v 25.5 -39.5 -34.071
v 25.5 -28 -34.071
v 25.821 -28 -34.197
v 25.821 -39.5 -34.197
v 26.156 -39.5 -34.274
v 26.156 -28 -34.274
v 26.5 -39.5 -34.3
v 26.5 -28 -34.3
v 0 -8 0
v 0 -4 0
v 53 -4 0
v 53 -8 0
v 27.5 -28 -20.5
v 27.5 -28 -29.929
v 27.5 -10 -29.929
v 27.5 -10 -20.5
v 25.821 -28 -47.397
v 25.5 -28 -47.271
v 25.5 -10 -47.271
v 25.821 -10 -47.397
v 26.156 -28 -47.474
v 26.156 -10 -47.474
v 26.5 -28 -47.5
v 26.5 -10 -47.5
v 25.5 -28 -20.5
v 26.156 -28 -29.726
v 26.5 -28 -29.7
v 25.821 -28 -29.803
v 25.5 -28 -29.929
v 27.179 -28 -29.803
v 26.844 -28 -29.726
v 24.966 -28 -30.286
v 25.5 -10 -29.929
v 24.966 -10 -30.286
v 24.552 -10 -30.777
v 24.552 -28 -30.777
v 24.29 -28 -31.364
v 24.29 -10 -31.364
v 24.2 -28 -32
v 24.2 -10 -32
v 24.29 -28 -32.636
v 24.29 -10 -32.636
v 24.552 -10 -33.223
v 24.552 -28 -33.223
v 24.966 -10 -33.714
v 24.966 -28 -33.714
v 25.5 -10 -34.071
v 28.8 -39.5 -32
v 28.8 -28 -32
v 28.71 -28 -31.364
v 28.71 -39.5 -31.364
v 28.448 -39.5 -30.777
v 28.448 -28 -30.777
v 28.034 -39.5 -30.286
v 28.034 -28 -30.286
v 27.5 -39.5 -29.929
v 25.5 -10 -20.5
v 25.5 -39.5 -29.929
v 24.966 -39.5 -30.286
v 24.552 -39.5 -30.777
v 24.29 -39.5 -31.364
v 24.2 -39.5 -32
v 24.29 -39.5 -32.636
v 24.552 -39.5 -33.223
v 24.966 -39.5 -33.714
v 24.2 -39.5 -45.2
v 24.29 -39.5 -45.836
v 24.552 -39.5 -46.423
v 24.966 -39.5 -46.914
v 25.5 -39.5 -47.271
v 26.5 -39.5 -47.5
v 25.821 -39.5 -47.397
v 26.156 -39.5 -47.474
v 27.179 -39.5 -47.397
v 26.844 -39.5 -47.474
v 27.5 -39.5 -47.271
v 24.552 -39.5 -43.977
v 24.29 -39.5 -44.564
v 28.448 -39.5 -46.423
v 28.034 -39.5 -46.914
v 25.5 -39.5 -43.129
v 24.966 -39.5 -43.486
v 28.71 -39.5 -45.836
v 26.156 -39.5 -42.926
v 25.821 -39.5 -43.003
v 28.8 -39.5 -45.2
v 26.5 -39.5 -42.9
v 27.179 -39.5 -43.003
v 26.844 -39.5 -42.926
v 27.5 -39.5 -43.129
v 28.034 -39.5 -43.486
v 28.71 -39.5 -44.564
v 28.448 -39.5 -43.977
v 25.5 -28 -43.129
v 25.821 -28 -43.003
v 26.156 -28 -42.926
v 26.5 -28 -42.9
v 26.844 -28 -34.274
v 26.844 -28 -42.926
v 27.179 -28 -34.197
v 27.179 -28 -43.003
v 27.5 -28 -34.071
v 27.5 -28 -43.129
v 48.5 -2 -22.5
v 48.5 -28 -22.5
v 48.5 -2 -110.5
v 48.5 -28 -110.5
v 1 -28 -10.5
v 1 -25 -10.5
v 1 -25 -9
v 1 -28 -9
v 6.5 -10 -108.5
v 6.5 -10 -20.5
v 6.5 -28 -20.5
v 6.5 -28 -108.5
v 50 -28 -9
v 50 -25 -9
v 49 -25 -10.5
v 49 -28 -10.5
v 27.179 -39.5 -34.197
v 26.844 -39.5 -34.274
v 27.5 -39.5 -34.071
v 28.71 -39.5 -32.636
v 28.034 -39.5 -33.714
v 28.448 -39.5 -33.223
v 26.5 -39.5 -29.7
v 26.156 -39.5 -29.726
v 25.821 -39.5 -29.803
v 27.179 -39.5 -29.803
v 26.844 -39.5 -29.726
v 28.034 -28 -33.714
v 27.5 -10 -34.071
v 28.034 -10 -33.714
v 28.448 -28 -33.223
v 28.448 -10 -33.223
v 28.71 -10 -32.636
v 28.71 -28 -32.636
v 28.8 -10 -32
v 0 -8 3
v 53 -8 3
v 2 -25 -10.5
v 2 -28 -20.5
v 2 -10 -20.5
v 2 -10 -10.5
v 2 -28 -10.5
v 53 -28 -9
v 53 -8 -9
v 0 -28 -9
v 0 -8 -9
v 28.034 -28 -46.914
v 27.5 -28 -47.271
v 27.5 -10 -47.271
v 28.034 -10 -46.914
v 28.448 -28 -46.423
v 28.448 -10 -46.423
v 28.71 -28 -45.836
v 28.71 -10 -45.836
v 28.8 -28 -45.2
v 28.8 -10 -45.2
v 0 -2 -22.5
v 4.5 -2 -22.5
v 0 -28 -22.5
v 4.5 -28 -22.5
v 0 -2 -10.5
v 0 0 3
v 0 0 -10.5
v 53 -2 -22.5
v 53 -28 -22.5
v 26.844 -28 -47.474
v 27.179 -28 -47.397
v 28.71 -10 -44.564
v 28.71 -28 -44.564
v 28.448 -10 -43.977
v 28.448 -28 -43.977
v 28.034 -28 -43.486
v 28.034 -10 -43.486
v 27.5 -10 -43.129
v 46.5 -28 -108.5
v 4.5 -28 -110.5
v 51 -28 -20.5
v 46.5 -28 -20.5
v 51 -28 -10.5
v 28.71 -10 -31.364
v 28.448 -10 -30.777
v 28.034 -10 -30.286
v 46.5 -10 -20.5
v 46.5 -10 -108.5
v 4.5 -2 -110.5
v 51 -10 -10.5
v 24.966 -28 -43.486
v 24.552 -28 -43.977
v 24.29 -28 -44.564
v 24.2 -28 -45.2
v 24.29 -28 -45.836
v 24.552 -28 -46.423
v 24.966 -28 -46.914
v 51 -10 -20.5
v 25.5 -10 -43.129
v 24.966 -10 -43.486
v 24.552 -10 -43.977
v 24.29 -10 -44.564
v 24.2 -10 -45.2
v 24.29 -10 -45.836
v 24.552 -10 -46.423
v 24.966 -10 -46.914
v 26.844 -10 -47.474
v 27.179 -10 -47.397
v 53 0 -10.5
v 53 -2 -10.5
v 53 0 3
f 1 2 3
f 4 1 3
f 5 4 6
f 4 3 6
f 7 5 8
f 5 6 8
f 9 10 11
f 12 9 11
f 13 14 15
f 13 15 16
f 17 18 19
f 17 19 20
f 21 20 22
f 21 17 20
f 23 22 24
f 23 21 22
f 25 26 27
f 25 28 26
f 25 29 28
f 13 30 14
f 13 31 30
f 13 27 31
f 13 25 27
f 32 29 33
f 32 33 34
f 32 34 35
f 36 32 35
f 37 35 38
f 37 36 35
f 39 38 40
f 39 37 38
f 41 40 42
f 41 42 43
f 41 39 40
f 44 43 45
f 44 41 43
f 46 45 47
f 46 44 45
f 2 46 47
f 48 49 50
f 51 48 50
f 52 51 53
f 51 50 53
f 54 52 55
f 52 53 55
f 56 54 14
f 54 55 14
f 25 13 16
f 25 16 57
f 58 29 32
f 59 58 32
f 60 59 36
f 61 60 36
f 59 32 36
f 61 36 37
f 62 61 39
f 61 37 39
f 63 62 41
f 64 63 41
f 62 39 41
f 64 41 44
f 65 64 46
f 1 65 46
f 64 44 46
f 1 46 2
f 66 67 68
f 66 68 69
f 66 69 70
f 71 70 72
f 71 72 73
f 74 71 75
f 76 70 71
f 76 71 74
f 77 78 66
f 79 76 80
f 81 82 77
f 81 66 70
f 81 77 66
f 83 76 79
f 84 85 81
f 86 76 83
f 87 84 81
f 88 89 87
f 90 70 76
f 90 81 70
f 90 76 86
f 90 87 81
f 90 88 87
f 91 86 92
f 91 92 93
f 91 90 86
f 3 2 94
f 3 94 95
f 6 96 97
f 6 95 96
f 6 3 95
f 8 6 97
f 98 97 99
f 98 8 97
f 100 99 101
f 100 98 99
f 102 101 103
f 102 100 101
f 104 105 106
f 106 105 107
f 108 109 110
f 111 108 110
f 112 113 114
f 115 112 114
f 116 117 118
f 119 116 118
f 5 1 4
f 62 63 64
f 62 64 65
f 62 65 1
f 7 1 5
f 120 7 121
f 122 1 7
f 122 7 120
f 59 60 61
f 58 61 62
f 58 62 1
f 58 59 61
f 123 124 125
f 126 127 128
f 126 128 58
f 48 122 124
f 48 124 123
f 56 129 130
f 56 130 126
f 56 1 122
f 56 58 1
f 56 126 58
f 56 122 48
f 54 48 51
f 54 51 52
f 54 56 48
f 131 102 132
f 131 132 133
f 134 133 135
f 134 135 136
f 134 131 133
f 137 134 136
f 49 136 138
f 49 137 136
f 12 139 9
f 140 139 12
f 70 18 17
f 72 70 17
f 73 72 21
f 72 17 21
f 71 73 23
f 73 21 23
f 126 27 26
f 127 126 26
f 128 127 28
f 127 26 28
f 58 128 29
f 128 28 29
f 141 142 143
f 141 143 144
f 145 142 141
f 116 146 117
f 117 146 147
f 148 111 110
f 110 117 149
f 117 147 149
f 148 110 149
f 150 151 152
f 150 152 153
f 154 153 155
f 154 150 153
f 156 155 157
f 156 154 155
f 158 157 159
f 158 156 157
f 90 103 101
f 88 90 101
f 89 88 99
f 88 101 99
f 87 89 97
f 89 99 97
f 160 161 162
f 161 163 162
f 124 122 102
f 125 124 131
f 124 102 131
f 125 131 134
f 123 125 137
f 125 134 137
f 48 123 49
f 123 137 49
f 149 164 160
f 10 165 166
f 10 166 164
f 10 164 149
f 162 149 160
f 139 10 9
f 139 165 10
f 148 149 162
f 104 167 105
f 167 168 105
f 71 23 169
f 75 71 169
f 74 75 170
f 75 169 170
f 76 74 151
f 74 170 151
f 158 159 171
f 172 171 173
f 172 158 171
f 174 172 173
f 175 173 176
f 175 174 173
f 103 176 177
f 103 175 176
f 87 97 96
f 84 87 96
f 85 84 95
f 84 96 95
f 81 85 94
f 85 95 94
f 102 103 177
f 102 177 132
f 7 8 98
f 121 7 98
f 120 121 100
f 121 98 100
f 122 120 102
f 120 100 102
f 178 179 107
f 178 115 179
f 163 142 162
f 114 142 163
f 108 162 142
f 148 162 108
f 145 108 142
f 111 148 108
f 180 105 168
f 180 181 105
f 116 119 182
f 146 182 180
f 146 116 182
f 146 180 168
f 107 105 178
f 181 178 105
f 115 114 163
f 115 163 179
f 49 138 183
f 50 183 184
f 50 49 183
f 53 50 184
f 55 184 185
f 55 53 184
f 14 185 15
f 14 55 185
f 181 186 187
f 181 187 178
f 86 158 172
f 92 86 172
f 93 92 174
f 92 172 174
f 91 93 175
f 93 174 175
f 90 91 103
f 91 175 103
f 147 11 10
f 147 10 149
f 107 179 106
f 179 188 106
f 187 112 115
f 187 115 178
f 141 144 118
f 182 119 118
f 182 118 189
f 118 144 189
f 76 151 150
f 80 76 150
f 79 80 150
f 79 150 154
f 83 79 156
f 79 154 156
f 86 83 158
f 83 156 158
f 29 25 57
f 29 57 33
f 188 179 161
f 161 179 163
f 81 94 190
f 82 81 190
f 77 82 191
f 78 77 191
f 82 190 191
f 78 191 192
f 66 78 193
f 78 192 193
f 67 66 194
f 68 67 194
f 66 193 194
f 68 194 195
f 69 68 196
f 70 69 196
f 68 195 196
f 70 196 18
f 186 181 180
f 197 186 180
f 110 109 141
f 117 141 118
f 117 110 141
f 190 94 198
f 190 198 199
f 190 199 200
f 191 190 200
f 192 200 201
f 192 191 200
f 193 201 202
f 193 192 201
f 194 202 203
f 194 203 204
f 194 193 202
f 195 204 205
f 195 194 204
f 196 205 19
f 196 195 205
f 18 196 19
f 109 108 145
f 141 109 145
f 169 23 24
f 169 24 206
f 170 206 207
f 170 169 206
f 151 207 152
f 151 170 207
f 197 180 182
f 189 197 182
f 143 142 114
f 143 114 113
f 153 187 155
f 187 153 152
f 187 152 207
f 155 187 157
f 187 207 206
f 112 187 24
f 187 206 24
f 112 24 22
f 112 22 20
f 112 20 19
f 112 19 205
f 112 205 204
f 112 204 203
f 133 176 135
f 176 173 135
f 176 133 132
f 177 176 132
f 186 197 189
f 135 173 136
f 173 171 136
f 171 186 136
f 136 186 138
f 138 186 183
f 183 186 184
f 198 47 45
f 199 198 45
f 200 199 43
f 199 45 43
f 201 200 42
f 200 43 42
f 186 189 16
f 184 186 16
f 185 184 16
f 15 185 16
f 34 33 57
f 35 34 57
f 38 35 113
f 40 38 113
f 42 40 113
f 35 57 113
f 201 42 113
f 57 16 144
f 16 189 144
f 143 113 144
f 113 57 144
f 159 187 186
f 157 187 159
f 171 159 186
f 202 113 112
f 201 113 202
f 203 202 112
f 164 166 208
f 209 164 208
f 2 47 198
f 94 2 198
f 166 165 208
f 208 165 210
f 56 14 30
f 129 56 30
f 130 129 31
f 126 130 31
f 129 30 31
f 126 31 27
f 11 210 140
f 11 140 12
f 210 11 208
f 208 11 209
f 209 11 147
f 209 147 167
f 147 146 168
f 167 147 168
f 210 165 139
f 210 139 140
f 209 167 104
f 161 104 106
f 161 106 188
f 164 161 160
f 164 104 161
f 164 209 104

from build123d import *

# Parameters (mm, degrees)
F0_W      = 53
F0_H      = 3
F1_DEPTH  = 8
F3_DEPTH  = 53
F5_DEPTH  = 8
F6_DEPTH  = 17
F7_DEPTH  = 20
F8_W      = 1
F8_H      = 1.5
F9_DEPTH  = 8
F10_DEPTH = 20
F11_DEPTH = 17
F12_W     = 2
F12_H     = 13
F13_DEPTH = 12
F14_W     = 18
F14_H     = 2
F15_DEPTH = 2.5
F16_DEPTH = 8
F17_DEPTH = 17
F18_W     = 2
F18_H     = 18
F19_DEPTH = 2
F20_DEPTH = 88
F21_W     = 2
F21_H     = 13
F22_DEPTH = 12
F23_W     = 18
F23_H     = 2
F24_DEPTH = 4.5
F25_W     = 2
F25_H     = 18
F26_DEPTH = 88
F27_W     = 2
F27_H     = 12
F28_DEPTH = 5
F29_W     = 2
F29_H     = 12
F30_DEPTH = 5
F31_W     = 40
F31_H     = 88
F31_H_2   = 2
F32_DEPTH = 8
F34_DEPTH = 18
F35_DEPTH = 26
F36_DEPTH = 4
F37_DEPTH = 11.5
F38_W     = 40
F38_H     = 2
F39_DEPTH = 18


# Not quite as in the source:
# - a feature names something its author has since deleted; it is built from what else it names


with BuildPart() as f1:
    # F0 (on Front) → F1 (new body)
    with BuildSketch(Plane.XZ):
        with Locations((26.5, 1.5)):
            Rectangle(F0_W, F0_H)
    extrude(amount=F1_DEPTH)

    # F2 (on face) → F3 (join)
    with BuildSketch(Plane.YZ.offset(53)):
        Polygon((0, -9), (0, 0), (-4, 0), (-8, -9), align=None)
    extrude(amount=-F3_DEPTH)

    # F4 (on face) → F5 (join)
    with BuildSketch(Plane.XZ.offset(8)):
        Polygon((53, -10), (53, -9), (50, -9), (49.5, -9.75), (49, -10.5), (50, -10.5), (53, -10.5), align=None)
    extrude(amount=-F5_DEPTH)

    # F4 (on face) → F6 (join)
    with BuildSketch(Plane.XZ.offset(8)):
        Polygon((53, -10), (53, -9), (50, -9), (49.5, -9.75), (49, -10.5), (50, -10.5), (53, -10.5), align=None)
    extrude(amount=F6_DEPTH)

    # F4 (on face) → F7 (join)
    with BuildSketch(Plane.XZ.offset(8)):
        Polygon((53, -10), (53, -9), (50, -9), (49.5, -9.75), (49, -10.5), (50, -10.5), (53, -10.5), align=None)
    extrude(amount=F7_DEPTH)

    # F8 (on face) → F9 (join)
    with BuildSketch(Plane.XZ.offset(8)):
        with Locations((0.5, -9.75)):
            Rectangle(F8_W, F8_H)
        Polygon((8, -9), (1, -9), (1, -10.5), (8, -10.5), (49.5, -10.5), (49.5, -9), align=None)
    extrude(amount=-F9_DEPTH)

    # F8 (on face) → F10 (join)
    with BuildSketch(Plane.XZ.offset(8)):
        with Locations((0.5, -9.75)):
            Rectangle(F8_W, F8_H)
    extrude(amount=F10_DEPTH)

    # F8 (on face) → F11 (join)
    with BuildSketch(Plane.XZ.offset(8)):
        Polygon((8, -9), (1, -9), (1, -10.5), (8, -10.5), (49.5, -10.5), (49.5, -9), align=None)
    extrude(amount=F11_DEPTH)

    # F12 (on face) → F13 (join)
    with BuildSketch(Plane(origin=(0, 0, -10.5), x_dir=(1, 0, 0), z_dir=(0, 0, -1))):
        with Locations((52, 21.5)):
            Rectangle(F12_W, F12_H)
    extrude(amount=F13_DEPTH)

    # F14 (on face) → F15 (join)
    with BuildSketch(Plane(origin=(51, 0, 0), x_dir=(0, -1, 0), z_dir=(-1, 0, 0))):
        with Locations((19, -21.5)):
            Rectangle(F14_W, F14_H)
    extrude(amount=F15_DEPTH)

    # F4 (on face) → F16 (join)
    with BuildSketch(Plane.XZ.offset(8)):
        Polygon((49.5, -9.75), (50, -9), (49.5, -9), align=None)
    extrude(amount=-F16_DEPTH)

    # F4 (on face) → F17 (join)
    with BuildSketch(Plane.XZ.offset(8)):
        Polygon((49.5, -9.75), (50, -9), (49.5, -9), align=None)
    extrude(amount=F17_DEPTH)

    # F18 (on face) → F19 (join)
    with BuildSketch(Plane(origin=(0, 0, -22.5), x_dir=(1, 0, 0), z_dir=(0, 0, -1))):
        with Locations((47.5, 19)):
            Rectangle(F18_W, F18_H)
    extrude(amount=-F19_DEPTH)

    # F18 (on face) → F20 (join)
    with BuildSketch(Plane(origin=(0, 0, -22.5), x_dir=(1, 0, 0), z_dir=(0, 0, -1))):
        with Locations((47.5, 19)):
            Rectangle(F18_W, F18_H)
    extrude(amount=F20_DEPTH)

    # F21 (on face) → F22 (join)
    with BuildSketch(Plane(origin=(0, 0, -10.5), x_dir=(1, 0, 0), z_dir=(0, 0, -1))):
        with Locations((1, 21.5)):
            Rectangle(F21_W, F21_H)
    extrude(amount=F22_DEPTH)

    # F23 (on face) → F24 (join)
    with BuildSketch(Plane.YZ.offset(2)):
        with Locations((-19, -21.5)):
            Rectangle(F23_W, F23_H)
    extrude(amount=F24_DEPTH)

    # F25 (on face) → F26 (join)
    with BuildSketch(Plane(origin=(0, 0, -22.5), x_dir=(1, 0, 0), z_dir=(0, 0, -1))):
        with Locations((5.5, 19)):
            Rectangle(F25_W, F25_H)
    extrude(amount=F26_DEPTH)

    # F27 (on face) → F28 (join)
    with BuildSketch(Plane(origin=(0, -15, 0), x_dir=(-1, 0, 0), z_dir=(0, 1, 0))):
        with Locations((-1, -16.5)):
            Rectangle(F27_W, F27_H)
    extrude(amount=F28_DEPTH)

    # F29 (on face) → F30 (join)
    with BuildSketch(Plane(origin=(0, -15, 0), x_dir=(-1, 0, 0), z_dir=(0, 1, 0))):
        with Locations((-52, -16.5)):
            Rectangle(F29_W, F29_H)
    extrude(amount=F30_DEPTH)

    # F30_face (on face) + F31 (on face) → F32 (join)
    with BuildSketch(Plane(origin=(48.0705741627, -10, -58.8205741627), x_dir=(-1, 0, 0), z_dir=(0, 1, 0))):
        Polygon((-2.9294258373, 38.3205741627), (-2.9294258373, 48.3205741627), (-4.9294258373, 48.3205741627), (-4.9294258373, 36.3205741627), (-0.4294258373, 36.3205741627), (-0.4294258373, -51.6794258373), (1.5705741627, -51.6794258373), (1.5705741627, 38.3205741627), align=None)
    with BuildSketch(Plane(origin=(0, -10, 0), x_dir=(-1, 0, 0), z_dir=(0, 1, 0))):
        Polygon((-2, -20.5), (-2, -10.5), (-51, -10.5), (-51, -20.5), (-46.5, -20.5), (-6.5, -20.5), align=None)
        Polygon((0, -10.5), (-2, -10.5), (-2, -20.5), (-6.5, -20.5), (-6.5, -108.5), (-6.5, -110.5), (-4.5, -110.5), (-4.5, -22.5), (0, -22.5), align=None)
        with Locations((-26.5, -64.5)):
            Rectangle(F31_W, F31_H)
        with Locations((-26.5, -109.5)):
            Rectangle(F31_W, F31_H_2)
    extrude(amount=F32_DEPTH)

    # F33 (on face) → F34 (join)
    with BuildSketch(Plane.XZ.offset(28)):
        with BuildLine():
            ThreePointArc((26.5, -42.9), (25.9870830919, -42.9579214453), (25.5, -43.1287684823))
            Line((25.5, -43.1287684823), (25.5, -47.2712315177))
            ThreePointArc((25.5, -47.2712315177), (25.9870830919, -47.4420785547), (26.5, -47.5))
            Line((26.5, -47.5), (26.5, -42.9))
        make_face()
        with BuildLine():
            ThreePointArc((27.5, -43.1287684823), (27.0129169081, -42.9579214453), (26.5, -42.9))
            Line((26.5, -42.9), (26.5, -47.5))
            ThreePointArc((26.5, -47.5), (27.0129169081, -47.4420785547), (27.5, -47.2712315177))
            Line((27.5, -47.2712315177), (27.5, -43.1287684823))
        make_face()
        with BuildLine():
            ThreePointArc((27.5, -34.0712315177), (27.0129169081, -34.2420785547), (26.5, -34.3))
            Line((26.5, -34.3), (26.5, -42.9))
            ThreePointArc((26.5, -42.9), (27.0129169081, -42.9579214453), (27.5, -43.1287684823))
            Line((27.5, -43.1287684823), (27.5, -34.0712315177))
        make_face()
        with BuildLine():
            ThreePointArc((26.5, -34.3), (25.9870830919, -34.2420785547), (25.5, -34.0712315177))
            Line((25.5, -34.0712315177), (25.5, -43.1287684823))
            ThreePointArc((25.5, -43.1287684823), (25.9870830919, -42.9579214453), (26.5, -42.9))
            Line((26.5, -42.9), (26.5, -34.3))
        make_face()
        with BuildLine():
            ThreePointArc((26.5, -29.7), (25.9870830919, -29.7579214453), (25.5, -29.9287684823))
            Line((25.5, -29.9287684823), (25.5, -34.0712315177))
            ThreePointArc((25.5, -34.0712315177), (25.9870830919, -34.2420785547), (26.5, -34.3))
            Line((26.5, -34.3), (26.5, -29.7))
        make_face()
        with BuildLine():
            ThreePointArc((27.5, -29.9287684823), (27.0129169081, -29.7579214453), (26.5, -29.7))
            Line((26.5, -29.7), (26.5, -34.3))
            ThreePointArc((26.5, -34.3), (27.0129169081, -34.2420785547), (27.5, -34.0712315177))
            Line((27.5, -34.0712315177), (27.5, -29.9287684823))
        make_face()
        with BuildLine():
            Line((27.5, -20.5), (26.5, -20.5))
            Line((26.5, -20.5), (26.5, -29.7))
            ThreePointArc((26.5, -29.7), (27.0129169081, -29.7579214453), (27.5, -29.9287684823))
            Line((27.5, -29.9287684823), (27.5, -20.5))
        make_face()
        with BuildLine():
            Line((26.5, -20.5), (25.5, -20.5))
            Line((25.5, -20.5), (25.5, -29.9287684823))
            ThreePointArc((25.5, -29.9287684823), (25.9870830919, -29.7579214453), (26.5, -29.7))
            Line((26.5, -29.7), (26.5, -20.5))
        make_face()
    extrude(amount=-F34_DEPTH)

    # F33 (on face) → F35 (join)
    with BuildSketch(Plane.XZ.offset(28)):
        with BuildLine():
            ThreePointArc((28.8, -32), (28.4480759739, -30.7772980739), (27.5, -29.9287684823))
            Line((27.5, -29.9287684823), (27.5, -34.0712315177))
            ThreePointArc((27.5, -34.0712315177), (28.4480759739, -33.2227019261), (28.8, -32))
        make_face()
        with BuildLine():
            ThreePointArc((27.5, -29.9287684823), (27.0129169081, -29.7579214453), (26.5, -29.7))
            Line((26.5, -29.7), (26.5, -34.3))
            ThreePointArc((26.5, -34.3), (27.0129169081, -34.2420785547), (27.5, -34.0712315177))
            Line((27.5, -34.0712315177), (27.5, -29.9287684823))
        make_face()
        with BuildLine():
            ThreePointArc((26.5, -29.7), (25.9870830919, -29.7579214453), (25.5, -29.9287684823))
            Line((25.5, -29.9287684823), (25.5, -34.0712315177))
            ThreePointArc((25.5, -34.0712315177), (25.9870830919, -34.2420785547), (26.5, -34.3))
            Line((26.5, -34.3), (26.5, -29.7))
        make_face()
        with BuildLine():
            Line((25.5, -34.0712315177), (25.5, -29.9287684823))
            ThreePointArc((25.5, -29.9287684823), (24.2, -32), (25.5, -34.0712315177))
        make_face()
        with BuildLine():
            ThreePointArc((26.5, -42.9), (25.9870830919, -42.9579214453), (25.5, -43.1287684823))
            Line((25.5, -43.1287684823), (25.5, -47.2712315177))
            ThreePointArc((25.5, -47.2712315177), (25.9870830919, -47.4420785547), (26.5, -47.5))
            Line((26.5, -47.5), (26.5, -42.9))
        make_face()
        with BuildLine():
            Line((25.5, -47.2712315177), (25.5, -43.1287684823))
            ThreePointArc((25.5, -43.1287684823), (24.2, -45.2), (25.5, -47.2712315177))
        make_face()
        with BuildLine():
            ThreePointArc((27.5, -43.1287684823), (27.0129169081, -42.9579214453), (26.5, -42.9))
            Line((26.5, -42.9), (26.5, -47.5))
            ThreePointArc((26.5, -47.5), (27.0129169081, -47.4420785547), (27.5, -47.2712315177))
            Line((27.5, -47.2712315177), (27.5, -43.1287684823))
        make_face()
        with BuildLine():
            ThreePointArc((28.8, -45.2), (28.4480759739, -43.9772980739), (27.5, -43.1287684823))
            Line((27.5, -43.1287684823), (27.5, -47.2712315177))
            ThreePointArc((27.5, -47.2712315177), (28.4480759739, -46.4227019261), (28.8, -45.2))
        make_face()
    extrude(amount=-F35_DEPTH)

    # F33 (on face) → F36 (cut)
    with BuildSketch(Plane.XZ.offset(28)):
        with BuildLine():
            Line((27.5, -20.5), (26.5, -20.5))
            Line((26.5, -20.5), (26.5, -29.7))
            ThreePointArc((26.5, -29.7), (27.0129169081, -29.7579214453), (27.5, -29.9287684823))
            Line((27.5, -29.9287684823), (27.5, -20.5))
        make_face()
        with BuildLine():
            Line((26.5, -20.5), (25.5, -20.5))
            Line((25.5, -20.5), (25.5, -29.9287684823))
            ThreePointArc((25.5, -29.9287684823), (25.9870830919, -29.7579214453), (26.5, -29.7))
            Line((26.5, -29.7), (26.5, -20.5))
        make_face()
        with BuildLine():
            ThreePointArc((26.5, -29.7), (25.9870830919, -29.7579214453), (25.5, -29.9287684823))
            Line((25.5, -29.9287684823), (25.5, -34.0712315177))
            ThreePointArc((25.5, -34.0712315177), (25.9870830919, -34.2420785547), (26.5, -34.3))
            Line((26.5, -34.3), (26.5, -29.7))
        make_face()
        with BuildLine():
            ThreePointArc((27.5, -29.9287684823), (27.0129169081, -29.7579214453), (26.5, -29.7))
            Line((26.5, -29.7), (26.5, -34.3))
            ThreePointArc((26.5, -34.3), (27.0129169081, -34.2420785547), (27.5, -34.0712315177))
            Line((27.5, -34.0712315177), (27.5, -29.9287684823))
        make_face()
        with BuildLine():
            ThreePointArc((27.5, -34.0712315177), (27.0129169081, -34.2420785547), (26.5, -34.3))
            Line((26.5, -34.3), (26.5, -42.9))
            ThreePointArc((26.5, -42.9), (27.0129169081, -42.9579214453), (27.5, -43.1287684823))
            Line((27.5, -43.1287684823), (27.5, -34.0712315177))
        make_face()
        with BuildLine():
            ThreePointArc((26.5, -34.3), (25.9870830919, -34.2420785547), (25.5, -34.0712315177))
            Line((25.5, -34.0712315177), (25.5, -43.1287684823))
            ThreePointArc((25.5, -43.1287684823), (25.9870830919, -42.9579214453), (26.5, -42.9))
            Line((26.5, -42.9), (26.5, -34.3))
        make_face()
        with BuildLine():
            ThreePointArc((26.5, -42.9), (25.9870830919, -42.9579214453), (25.5, -43.1287684823))
            Line((25.5, -43.1287684823), (25.5, -47.2712315177))
            ThreePointArc((25.5, -47.2712315177), (25.9870830919, -47.4420785547), (26.5, -47.5))
            Line((26.5, -47.5), (26.5, -42.9))
        make_face()
        with BuildLine():
            ThreePointArc((27.5, -43.1287684823), (27.0129169081, -42.9579214453), (26.5, -42.9))
            Line((26.5, -42.9), (26.5, -47.5))
            ThreePointArc((26.5, -47.5), (27.0129169081, -47.4420785547), (27.5, -47.2712315177))
            Line((27.5, -47.2712315177), (27.5, -43.1287684823))
        make_face()
    extrude(amount=F36_DEPTH, mode=Mode.SUBTRACT)

    # F33 (on face) → F37 (join)
    with BuildSketch(Plane.XZ.offset(28)):
        with BuildLine():
            ThreePointArc((28.8, -32), (28.4480759739, -30.7772980739), (27.5, -29.9287684823))
            Line((27.5, -29.9287684823), (27.5, -34.0712315177))
            ThreePointArc((27.5, -34.0712315177), (28.4480759739, -33.2227019261), (28.8, -32))
        make_face()
        with BuildLine():
            ThreePointArc((27.5, -29.9287684823), (27.0129169081, -29.7579214453), (26.5, -29.7))
            Line((26.5, -29.7), (26.5, -34.3))
            ThreePointArc((26.5, -34.3), (27.0129169081, -34.2420785547), (27.5, -34.0712315177))
            Line((27.5, -34.0712315177), (27.5, -29.9287684823))
        make_face()
        with BuildLine():
            ThreePointArc((26.5, -29.7), (25.9870830919, -29.7579214453), (25.5, -29.9287684823))
            Line((25.5, -29.9287684823), (25.5, -34.0712315177))
            ThreePointArc((25.5, -34.0712315177), (25.9870830919, -34.2420785547), (26.5, -34.3))
            Line((26.5, -34.3), (26.5, -29.7))
        make_face()
        with BuildLine():
            Line((25.5, -34.0712315177), (25.5, -29.9287684823))
            ThreePointArc((25.5, -29.9287684823), (24.2, -32), (25.5, -34.0712315177))
        make_face()
        with BuildLine():
            Line((25.5, -47.2712315177), (25.5, -43.1287684823))
            ThreePointArc((25.5, -43.1287684823), (24.2, -45.2), (25.5, -47.2712315177))
        make_face()
        with BuildLine():
            ThreePointArc((26.5, -42.9), (25.9870830919, -42.9579214453), (25.5, -43.1287684823))
            Line((25.5, -43.1287684823), (25.5, -47.2712315177))
            ThreePointArc((25.5, -47.2712315177), (25.9870830919, -47.4420785547), (26.5, -47.5))
            Line((26.5, -47.5), (26.5, -42.9))
        make_face()
        with BuildLine():
            ThreePointArc((27.5, -43.1287684823), (27.0129169081, -42.9579214453), (26.5, -42.9))
            Line((26.5, -42.9), (26.5, -47.5))
            ThreePointArc((26.5, -47.5), (27.0129169081, -47.4420785547), (27.5, -47.2712315177))
            Line((27.5, -47.2712315177), (27.5, -43.1287684823))
        make_face()
        with BuildLine():
            ThreePointArc((28.8, -45.2), (28.4480759739, -43.9772980739), (27.5, -43.1287684823))
            Line((27.5, -43.1287684823), (27.5, -47.2712315177))
            ThreePointArc((27.5, -47.2712315177), (28.4480759739, -46.4227019261), (28.8, -45.2))
        make_face()
    extrude(amount=F37_DEPTH)

    # F38 (on face) → F39 (join)
    with BuildSketch(Plane.XZ.offset(10)):
        with Locations((26.5, -109.5)):
            Rectangle(F38_W, F38_H)
    extrude(amount=F39_DEPTH)


solid = f1.part
